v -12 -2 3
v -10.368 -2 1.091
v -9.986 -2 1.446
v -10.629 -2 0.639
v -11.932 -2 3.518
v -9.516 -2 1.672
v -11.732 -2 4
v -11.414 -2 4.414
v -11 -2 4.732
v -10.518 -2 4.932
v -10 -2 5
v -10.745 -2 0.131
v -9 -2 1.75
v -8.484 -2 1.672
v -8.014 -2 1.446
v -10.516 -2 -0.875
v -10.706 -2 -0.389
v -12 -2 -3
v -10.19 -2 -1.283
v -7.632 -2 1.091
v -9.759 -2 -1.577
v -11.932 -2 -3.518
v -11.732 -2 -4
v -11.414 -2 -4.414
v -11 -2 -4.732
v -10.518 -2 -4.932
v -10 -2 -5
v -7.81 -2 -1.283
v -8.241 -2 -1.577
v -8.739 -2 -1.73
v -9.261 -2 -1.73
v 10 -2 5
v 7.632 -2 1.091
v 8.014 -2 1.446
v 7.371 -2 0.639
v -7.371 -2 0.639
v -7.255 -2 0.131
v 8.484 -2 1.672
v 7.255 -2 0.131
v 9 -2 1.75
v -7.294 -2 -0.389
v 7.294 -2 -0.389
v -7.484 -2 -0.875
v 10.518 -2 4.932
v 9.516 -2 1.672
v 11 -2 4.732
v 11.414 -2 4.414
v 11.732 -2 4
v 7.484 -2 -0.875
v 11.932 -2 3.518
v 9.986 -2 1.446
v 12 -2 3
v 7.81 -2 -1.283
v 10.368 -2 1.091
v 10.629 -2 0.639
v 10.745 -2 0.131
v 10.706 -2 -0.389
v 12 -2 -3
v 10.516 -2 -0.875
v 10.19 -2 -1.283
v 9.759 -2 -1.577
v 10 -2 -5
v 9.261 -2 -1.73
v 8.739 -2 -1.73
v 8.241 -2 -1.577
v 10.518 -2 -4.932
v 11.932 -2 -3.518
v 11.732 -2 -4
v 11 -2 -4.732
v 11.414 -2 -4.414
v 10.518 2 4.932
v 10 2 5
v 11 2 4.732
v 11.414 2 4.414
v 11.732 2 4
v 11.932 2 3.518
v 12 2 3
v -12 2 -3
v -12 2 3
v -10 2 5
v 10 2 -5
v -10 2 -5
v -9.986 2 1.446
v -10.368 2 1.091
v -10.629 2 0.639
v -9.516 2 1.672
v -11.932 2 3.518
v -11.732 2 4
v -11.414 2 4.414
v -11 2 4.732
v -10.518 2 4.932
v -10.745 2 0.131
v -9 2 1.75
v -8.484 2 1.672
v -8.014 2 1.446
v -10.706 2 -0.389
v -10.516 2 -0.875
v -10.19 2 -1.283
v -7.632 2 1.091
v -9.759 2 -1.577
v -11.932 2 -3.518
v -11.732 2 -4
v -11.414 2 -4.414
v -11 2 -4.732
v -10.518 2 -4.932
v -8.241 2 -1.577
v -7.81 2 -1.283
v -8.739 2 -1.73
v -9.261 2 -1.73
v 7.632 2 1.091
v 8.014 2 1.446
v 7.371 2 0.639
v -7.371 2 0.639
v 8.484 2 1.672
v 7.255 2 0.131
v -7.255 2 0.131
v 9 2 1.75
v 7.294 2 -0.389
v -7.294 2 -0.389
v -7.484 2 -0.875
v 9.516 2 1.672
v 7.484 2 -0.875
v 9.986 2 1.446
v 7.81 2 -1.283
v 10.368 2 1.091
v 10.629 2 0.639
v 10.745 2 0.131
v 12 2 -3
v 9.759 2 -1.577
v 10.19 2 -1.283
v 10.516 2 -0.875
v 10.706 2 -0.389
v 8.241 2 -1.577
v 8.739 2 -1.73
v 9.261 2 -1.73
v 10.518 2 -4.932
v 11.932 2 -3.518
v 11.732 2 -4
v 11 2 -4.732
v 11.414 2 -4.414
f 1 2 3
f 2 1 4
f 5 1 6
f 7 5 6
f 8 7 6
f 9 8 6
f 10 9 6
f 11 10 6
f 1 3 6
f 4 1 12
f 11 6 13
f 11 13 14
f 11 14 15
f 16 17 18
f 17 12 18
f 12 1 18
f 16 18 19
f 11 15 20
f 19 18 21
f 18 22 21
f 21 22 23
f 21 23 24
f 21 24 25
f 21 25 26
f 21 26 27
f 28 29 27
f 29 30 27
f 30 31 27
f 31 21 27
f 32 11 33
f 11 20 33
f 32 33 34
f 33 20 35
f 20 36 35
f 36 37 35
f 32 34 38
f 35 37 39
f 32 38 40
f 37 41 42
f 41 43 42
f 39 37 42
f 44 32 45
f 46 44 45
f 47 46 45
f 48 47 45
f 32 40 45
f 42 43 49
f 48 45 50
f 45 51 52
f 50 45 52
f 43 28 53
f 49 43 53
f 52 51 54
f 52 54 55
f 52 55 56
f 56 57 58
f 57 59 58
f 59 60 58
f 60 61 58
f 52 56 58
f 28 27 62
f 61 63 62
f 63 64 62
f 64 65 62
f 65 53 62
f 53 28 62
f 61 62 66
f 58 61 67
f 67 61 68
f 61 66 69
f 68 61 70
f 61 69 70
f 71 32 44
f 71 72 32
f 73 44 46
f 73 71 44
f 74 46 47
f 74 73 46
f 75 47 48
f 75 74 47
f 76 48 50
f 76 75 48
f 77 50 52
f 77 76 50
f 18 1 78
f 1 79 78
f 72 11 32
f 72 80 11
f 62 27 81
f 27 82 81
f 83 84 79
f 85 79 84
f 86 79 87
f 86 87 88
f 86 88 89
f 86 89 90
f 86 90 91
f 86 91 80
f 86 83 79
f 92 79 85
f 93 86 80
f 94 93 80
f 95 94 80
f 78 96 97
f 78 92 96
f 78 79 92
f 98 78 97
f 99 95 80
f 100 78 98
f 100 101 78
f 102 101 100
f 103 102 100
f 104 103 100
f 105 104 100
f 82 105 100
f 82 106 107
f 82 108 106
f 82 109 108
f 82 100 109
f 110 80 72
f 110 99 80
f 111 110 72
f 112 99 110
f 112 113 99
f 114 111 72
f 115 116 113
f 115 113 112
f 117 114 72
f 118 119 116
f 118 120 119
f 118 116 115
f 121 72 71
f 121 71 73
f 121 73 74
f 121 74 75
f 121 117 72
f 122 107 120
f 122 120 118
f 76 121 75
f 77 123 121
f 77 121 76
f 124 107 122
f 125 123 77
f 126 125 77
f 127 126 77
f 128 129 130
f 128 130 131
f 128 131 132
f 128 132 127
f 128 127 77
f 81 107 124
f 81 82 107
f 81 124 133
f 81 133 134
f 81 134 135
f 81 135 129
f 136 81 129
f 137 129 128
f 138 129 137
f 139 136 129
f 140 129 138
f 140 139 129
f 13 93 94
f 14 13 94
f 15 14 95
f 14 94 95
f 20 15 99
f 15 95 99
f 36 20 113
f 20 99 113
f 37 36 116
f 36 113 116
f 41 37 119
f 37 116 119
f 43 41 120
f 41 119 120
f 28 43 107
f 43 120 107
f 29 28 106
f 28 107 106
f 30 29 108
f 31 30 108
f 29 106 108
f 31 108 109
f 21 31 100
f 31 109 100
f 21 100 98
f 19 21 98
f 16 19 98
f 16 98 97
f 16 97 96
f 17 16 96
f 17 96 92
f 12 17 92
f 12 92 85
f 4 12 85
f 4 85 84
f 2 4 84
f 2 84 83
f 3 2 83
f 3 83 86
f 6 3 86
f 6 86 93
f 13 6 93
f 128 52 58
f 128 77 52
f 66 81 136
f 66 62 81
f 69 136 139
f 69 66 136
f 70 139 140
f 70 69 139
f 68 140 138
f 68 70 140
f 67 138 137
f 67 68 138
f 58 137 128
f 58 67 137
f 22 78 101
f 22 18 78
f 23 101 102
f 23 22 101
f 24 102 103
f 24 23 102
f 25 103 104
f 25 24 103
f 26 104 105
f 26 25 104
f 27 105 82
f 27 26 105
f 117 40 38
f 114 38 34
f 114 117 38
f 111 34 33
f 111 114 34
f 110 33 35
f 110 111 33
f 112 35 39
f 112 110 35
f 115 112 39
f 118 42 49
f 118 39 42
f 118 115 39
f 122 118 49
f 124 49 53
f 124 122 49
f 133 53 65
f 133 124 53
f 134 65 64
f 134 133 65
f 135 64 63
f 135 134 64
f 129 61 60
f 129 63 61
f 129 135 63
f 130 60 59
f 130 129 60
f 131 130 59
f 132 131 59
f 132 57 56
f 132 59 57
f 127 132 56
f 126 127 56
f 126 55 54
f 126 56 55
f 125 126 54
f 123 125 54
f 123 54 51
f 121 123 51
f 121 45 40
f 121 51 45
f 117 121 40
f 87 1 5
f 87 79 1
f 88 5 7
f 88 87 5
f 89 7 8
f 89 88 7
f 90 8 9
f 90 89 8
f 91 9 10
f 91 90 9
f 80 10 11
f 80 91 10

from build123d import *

# Parameters (mm, degrees)
ESBO_O1_W                = 24
ESBO_O1_H                = 10
RESSALTO_EXTRUS_O1_DEPTH = 2
ESBO_O2_R                = 1.75
CORTE_EXTRUS_O1_DEPTH    = 14.601470509
FILETE1_R                = 2


with BuildPart() as part:
    # Esboço1 → Ressalto-extrusão1 (new, symmetric)
    with BuildSketch(Plane(origin=(0, 0, 0), x_dir=(1, 0, 0), z_dir=(0, 1, 0))):
        Rectangle(ESBO_O1_W, ESBO_O1_H)
    extrude(amount=RESSALTO_EXTRUS_O1_DEPTH, both=True)

    # Esboço2 → Corte-extrusão1 (cut, through all)
    with BuildSketch(Plane(origin=(0, 2, 0), x_dir=(1, 0, 0), z_dir=(0, 1, 0))):
        with Locations(Location((-9, 0, 0), (0, 0, 270))):
            Circle(ESBO_O2_R)
    corte_extrus_o1 = extrude(amount=-CORTE_EXTRUS_O1_DEPTH, mode=Mode.SUBTRACT)

    # Espelhar1: Corte-extrusão1 across plane
    add(corte_extrus_o1.mirror(Plane(origin=(0, 0, 0), x_dir=(0, 0, 1), z_dir=(1, 0, 0))), mode=Mode.SUBTRACT)

    # Filete1
    filete1_edges = [part.edges().sort_by_distance(p)[0] for p in [
        (12, 0, 5),
        (-12, 0, 5),
        (-12, 0, -5),
        (12, 0, -5),
    ]]
    fillet(filete1_edges, radius=FILETE1_R)


solid = part.part
